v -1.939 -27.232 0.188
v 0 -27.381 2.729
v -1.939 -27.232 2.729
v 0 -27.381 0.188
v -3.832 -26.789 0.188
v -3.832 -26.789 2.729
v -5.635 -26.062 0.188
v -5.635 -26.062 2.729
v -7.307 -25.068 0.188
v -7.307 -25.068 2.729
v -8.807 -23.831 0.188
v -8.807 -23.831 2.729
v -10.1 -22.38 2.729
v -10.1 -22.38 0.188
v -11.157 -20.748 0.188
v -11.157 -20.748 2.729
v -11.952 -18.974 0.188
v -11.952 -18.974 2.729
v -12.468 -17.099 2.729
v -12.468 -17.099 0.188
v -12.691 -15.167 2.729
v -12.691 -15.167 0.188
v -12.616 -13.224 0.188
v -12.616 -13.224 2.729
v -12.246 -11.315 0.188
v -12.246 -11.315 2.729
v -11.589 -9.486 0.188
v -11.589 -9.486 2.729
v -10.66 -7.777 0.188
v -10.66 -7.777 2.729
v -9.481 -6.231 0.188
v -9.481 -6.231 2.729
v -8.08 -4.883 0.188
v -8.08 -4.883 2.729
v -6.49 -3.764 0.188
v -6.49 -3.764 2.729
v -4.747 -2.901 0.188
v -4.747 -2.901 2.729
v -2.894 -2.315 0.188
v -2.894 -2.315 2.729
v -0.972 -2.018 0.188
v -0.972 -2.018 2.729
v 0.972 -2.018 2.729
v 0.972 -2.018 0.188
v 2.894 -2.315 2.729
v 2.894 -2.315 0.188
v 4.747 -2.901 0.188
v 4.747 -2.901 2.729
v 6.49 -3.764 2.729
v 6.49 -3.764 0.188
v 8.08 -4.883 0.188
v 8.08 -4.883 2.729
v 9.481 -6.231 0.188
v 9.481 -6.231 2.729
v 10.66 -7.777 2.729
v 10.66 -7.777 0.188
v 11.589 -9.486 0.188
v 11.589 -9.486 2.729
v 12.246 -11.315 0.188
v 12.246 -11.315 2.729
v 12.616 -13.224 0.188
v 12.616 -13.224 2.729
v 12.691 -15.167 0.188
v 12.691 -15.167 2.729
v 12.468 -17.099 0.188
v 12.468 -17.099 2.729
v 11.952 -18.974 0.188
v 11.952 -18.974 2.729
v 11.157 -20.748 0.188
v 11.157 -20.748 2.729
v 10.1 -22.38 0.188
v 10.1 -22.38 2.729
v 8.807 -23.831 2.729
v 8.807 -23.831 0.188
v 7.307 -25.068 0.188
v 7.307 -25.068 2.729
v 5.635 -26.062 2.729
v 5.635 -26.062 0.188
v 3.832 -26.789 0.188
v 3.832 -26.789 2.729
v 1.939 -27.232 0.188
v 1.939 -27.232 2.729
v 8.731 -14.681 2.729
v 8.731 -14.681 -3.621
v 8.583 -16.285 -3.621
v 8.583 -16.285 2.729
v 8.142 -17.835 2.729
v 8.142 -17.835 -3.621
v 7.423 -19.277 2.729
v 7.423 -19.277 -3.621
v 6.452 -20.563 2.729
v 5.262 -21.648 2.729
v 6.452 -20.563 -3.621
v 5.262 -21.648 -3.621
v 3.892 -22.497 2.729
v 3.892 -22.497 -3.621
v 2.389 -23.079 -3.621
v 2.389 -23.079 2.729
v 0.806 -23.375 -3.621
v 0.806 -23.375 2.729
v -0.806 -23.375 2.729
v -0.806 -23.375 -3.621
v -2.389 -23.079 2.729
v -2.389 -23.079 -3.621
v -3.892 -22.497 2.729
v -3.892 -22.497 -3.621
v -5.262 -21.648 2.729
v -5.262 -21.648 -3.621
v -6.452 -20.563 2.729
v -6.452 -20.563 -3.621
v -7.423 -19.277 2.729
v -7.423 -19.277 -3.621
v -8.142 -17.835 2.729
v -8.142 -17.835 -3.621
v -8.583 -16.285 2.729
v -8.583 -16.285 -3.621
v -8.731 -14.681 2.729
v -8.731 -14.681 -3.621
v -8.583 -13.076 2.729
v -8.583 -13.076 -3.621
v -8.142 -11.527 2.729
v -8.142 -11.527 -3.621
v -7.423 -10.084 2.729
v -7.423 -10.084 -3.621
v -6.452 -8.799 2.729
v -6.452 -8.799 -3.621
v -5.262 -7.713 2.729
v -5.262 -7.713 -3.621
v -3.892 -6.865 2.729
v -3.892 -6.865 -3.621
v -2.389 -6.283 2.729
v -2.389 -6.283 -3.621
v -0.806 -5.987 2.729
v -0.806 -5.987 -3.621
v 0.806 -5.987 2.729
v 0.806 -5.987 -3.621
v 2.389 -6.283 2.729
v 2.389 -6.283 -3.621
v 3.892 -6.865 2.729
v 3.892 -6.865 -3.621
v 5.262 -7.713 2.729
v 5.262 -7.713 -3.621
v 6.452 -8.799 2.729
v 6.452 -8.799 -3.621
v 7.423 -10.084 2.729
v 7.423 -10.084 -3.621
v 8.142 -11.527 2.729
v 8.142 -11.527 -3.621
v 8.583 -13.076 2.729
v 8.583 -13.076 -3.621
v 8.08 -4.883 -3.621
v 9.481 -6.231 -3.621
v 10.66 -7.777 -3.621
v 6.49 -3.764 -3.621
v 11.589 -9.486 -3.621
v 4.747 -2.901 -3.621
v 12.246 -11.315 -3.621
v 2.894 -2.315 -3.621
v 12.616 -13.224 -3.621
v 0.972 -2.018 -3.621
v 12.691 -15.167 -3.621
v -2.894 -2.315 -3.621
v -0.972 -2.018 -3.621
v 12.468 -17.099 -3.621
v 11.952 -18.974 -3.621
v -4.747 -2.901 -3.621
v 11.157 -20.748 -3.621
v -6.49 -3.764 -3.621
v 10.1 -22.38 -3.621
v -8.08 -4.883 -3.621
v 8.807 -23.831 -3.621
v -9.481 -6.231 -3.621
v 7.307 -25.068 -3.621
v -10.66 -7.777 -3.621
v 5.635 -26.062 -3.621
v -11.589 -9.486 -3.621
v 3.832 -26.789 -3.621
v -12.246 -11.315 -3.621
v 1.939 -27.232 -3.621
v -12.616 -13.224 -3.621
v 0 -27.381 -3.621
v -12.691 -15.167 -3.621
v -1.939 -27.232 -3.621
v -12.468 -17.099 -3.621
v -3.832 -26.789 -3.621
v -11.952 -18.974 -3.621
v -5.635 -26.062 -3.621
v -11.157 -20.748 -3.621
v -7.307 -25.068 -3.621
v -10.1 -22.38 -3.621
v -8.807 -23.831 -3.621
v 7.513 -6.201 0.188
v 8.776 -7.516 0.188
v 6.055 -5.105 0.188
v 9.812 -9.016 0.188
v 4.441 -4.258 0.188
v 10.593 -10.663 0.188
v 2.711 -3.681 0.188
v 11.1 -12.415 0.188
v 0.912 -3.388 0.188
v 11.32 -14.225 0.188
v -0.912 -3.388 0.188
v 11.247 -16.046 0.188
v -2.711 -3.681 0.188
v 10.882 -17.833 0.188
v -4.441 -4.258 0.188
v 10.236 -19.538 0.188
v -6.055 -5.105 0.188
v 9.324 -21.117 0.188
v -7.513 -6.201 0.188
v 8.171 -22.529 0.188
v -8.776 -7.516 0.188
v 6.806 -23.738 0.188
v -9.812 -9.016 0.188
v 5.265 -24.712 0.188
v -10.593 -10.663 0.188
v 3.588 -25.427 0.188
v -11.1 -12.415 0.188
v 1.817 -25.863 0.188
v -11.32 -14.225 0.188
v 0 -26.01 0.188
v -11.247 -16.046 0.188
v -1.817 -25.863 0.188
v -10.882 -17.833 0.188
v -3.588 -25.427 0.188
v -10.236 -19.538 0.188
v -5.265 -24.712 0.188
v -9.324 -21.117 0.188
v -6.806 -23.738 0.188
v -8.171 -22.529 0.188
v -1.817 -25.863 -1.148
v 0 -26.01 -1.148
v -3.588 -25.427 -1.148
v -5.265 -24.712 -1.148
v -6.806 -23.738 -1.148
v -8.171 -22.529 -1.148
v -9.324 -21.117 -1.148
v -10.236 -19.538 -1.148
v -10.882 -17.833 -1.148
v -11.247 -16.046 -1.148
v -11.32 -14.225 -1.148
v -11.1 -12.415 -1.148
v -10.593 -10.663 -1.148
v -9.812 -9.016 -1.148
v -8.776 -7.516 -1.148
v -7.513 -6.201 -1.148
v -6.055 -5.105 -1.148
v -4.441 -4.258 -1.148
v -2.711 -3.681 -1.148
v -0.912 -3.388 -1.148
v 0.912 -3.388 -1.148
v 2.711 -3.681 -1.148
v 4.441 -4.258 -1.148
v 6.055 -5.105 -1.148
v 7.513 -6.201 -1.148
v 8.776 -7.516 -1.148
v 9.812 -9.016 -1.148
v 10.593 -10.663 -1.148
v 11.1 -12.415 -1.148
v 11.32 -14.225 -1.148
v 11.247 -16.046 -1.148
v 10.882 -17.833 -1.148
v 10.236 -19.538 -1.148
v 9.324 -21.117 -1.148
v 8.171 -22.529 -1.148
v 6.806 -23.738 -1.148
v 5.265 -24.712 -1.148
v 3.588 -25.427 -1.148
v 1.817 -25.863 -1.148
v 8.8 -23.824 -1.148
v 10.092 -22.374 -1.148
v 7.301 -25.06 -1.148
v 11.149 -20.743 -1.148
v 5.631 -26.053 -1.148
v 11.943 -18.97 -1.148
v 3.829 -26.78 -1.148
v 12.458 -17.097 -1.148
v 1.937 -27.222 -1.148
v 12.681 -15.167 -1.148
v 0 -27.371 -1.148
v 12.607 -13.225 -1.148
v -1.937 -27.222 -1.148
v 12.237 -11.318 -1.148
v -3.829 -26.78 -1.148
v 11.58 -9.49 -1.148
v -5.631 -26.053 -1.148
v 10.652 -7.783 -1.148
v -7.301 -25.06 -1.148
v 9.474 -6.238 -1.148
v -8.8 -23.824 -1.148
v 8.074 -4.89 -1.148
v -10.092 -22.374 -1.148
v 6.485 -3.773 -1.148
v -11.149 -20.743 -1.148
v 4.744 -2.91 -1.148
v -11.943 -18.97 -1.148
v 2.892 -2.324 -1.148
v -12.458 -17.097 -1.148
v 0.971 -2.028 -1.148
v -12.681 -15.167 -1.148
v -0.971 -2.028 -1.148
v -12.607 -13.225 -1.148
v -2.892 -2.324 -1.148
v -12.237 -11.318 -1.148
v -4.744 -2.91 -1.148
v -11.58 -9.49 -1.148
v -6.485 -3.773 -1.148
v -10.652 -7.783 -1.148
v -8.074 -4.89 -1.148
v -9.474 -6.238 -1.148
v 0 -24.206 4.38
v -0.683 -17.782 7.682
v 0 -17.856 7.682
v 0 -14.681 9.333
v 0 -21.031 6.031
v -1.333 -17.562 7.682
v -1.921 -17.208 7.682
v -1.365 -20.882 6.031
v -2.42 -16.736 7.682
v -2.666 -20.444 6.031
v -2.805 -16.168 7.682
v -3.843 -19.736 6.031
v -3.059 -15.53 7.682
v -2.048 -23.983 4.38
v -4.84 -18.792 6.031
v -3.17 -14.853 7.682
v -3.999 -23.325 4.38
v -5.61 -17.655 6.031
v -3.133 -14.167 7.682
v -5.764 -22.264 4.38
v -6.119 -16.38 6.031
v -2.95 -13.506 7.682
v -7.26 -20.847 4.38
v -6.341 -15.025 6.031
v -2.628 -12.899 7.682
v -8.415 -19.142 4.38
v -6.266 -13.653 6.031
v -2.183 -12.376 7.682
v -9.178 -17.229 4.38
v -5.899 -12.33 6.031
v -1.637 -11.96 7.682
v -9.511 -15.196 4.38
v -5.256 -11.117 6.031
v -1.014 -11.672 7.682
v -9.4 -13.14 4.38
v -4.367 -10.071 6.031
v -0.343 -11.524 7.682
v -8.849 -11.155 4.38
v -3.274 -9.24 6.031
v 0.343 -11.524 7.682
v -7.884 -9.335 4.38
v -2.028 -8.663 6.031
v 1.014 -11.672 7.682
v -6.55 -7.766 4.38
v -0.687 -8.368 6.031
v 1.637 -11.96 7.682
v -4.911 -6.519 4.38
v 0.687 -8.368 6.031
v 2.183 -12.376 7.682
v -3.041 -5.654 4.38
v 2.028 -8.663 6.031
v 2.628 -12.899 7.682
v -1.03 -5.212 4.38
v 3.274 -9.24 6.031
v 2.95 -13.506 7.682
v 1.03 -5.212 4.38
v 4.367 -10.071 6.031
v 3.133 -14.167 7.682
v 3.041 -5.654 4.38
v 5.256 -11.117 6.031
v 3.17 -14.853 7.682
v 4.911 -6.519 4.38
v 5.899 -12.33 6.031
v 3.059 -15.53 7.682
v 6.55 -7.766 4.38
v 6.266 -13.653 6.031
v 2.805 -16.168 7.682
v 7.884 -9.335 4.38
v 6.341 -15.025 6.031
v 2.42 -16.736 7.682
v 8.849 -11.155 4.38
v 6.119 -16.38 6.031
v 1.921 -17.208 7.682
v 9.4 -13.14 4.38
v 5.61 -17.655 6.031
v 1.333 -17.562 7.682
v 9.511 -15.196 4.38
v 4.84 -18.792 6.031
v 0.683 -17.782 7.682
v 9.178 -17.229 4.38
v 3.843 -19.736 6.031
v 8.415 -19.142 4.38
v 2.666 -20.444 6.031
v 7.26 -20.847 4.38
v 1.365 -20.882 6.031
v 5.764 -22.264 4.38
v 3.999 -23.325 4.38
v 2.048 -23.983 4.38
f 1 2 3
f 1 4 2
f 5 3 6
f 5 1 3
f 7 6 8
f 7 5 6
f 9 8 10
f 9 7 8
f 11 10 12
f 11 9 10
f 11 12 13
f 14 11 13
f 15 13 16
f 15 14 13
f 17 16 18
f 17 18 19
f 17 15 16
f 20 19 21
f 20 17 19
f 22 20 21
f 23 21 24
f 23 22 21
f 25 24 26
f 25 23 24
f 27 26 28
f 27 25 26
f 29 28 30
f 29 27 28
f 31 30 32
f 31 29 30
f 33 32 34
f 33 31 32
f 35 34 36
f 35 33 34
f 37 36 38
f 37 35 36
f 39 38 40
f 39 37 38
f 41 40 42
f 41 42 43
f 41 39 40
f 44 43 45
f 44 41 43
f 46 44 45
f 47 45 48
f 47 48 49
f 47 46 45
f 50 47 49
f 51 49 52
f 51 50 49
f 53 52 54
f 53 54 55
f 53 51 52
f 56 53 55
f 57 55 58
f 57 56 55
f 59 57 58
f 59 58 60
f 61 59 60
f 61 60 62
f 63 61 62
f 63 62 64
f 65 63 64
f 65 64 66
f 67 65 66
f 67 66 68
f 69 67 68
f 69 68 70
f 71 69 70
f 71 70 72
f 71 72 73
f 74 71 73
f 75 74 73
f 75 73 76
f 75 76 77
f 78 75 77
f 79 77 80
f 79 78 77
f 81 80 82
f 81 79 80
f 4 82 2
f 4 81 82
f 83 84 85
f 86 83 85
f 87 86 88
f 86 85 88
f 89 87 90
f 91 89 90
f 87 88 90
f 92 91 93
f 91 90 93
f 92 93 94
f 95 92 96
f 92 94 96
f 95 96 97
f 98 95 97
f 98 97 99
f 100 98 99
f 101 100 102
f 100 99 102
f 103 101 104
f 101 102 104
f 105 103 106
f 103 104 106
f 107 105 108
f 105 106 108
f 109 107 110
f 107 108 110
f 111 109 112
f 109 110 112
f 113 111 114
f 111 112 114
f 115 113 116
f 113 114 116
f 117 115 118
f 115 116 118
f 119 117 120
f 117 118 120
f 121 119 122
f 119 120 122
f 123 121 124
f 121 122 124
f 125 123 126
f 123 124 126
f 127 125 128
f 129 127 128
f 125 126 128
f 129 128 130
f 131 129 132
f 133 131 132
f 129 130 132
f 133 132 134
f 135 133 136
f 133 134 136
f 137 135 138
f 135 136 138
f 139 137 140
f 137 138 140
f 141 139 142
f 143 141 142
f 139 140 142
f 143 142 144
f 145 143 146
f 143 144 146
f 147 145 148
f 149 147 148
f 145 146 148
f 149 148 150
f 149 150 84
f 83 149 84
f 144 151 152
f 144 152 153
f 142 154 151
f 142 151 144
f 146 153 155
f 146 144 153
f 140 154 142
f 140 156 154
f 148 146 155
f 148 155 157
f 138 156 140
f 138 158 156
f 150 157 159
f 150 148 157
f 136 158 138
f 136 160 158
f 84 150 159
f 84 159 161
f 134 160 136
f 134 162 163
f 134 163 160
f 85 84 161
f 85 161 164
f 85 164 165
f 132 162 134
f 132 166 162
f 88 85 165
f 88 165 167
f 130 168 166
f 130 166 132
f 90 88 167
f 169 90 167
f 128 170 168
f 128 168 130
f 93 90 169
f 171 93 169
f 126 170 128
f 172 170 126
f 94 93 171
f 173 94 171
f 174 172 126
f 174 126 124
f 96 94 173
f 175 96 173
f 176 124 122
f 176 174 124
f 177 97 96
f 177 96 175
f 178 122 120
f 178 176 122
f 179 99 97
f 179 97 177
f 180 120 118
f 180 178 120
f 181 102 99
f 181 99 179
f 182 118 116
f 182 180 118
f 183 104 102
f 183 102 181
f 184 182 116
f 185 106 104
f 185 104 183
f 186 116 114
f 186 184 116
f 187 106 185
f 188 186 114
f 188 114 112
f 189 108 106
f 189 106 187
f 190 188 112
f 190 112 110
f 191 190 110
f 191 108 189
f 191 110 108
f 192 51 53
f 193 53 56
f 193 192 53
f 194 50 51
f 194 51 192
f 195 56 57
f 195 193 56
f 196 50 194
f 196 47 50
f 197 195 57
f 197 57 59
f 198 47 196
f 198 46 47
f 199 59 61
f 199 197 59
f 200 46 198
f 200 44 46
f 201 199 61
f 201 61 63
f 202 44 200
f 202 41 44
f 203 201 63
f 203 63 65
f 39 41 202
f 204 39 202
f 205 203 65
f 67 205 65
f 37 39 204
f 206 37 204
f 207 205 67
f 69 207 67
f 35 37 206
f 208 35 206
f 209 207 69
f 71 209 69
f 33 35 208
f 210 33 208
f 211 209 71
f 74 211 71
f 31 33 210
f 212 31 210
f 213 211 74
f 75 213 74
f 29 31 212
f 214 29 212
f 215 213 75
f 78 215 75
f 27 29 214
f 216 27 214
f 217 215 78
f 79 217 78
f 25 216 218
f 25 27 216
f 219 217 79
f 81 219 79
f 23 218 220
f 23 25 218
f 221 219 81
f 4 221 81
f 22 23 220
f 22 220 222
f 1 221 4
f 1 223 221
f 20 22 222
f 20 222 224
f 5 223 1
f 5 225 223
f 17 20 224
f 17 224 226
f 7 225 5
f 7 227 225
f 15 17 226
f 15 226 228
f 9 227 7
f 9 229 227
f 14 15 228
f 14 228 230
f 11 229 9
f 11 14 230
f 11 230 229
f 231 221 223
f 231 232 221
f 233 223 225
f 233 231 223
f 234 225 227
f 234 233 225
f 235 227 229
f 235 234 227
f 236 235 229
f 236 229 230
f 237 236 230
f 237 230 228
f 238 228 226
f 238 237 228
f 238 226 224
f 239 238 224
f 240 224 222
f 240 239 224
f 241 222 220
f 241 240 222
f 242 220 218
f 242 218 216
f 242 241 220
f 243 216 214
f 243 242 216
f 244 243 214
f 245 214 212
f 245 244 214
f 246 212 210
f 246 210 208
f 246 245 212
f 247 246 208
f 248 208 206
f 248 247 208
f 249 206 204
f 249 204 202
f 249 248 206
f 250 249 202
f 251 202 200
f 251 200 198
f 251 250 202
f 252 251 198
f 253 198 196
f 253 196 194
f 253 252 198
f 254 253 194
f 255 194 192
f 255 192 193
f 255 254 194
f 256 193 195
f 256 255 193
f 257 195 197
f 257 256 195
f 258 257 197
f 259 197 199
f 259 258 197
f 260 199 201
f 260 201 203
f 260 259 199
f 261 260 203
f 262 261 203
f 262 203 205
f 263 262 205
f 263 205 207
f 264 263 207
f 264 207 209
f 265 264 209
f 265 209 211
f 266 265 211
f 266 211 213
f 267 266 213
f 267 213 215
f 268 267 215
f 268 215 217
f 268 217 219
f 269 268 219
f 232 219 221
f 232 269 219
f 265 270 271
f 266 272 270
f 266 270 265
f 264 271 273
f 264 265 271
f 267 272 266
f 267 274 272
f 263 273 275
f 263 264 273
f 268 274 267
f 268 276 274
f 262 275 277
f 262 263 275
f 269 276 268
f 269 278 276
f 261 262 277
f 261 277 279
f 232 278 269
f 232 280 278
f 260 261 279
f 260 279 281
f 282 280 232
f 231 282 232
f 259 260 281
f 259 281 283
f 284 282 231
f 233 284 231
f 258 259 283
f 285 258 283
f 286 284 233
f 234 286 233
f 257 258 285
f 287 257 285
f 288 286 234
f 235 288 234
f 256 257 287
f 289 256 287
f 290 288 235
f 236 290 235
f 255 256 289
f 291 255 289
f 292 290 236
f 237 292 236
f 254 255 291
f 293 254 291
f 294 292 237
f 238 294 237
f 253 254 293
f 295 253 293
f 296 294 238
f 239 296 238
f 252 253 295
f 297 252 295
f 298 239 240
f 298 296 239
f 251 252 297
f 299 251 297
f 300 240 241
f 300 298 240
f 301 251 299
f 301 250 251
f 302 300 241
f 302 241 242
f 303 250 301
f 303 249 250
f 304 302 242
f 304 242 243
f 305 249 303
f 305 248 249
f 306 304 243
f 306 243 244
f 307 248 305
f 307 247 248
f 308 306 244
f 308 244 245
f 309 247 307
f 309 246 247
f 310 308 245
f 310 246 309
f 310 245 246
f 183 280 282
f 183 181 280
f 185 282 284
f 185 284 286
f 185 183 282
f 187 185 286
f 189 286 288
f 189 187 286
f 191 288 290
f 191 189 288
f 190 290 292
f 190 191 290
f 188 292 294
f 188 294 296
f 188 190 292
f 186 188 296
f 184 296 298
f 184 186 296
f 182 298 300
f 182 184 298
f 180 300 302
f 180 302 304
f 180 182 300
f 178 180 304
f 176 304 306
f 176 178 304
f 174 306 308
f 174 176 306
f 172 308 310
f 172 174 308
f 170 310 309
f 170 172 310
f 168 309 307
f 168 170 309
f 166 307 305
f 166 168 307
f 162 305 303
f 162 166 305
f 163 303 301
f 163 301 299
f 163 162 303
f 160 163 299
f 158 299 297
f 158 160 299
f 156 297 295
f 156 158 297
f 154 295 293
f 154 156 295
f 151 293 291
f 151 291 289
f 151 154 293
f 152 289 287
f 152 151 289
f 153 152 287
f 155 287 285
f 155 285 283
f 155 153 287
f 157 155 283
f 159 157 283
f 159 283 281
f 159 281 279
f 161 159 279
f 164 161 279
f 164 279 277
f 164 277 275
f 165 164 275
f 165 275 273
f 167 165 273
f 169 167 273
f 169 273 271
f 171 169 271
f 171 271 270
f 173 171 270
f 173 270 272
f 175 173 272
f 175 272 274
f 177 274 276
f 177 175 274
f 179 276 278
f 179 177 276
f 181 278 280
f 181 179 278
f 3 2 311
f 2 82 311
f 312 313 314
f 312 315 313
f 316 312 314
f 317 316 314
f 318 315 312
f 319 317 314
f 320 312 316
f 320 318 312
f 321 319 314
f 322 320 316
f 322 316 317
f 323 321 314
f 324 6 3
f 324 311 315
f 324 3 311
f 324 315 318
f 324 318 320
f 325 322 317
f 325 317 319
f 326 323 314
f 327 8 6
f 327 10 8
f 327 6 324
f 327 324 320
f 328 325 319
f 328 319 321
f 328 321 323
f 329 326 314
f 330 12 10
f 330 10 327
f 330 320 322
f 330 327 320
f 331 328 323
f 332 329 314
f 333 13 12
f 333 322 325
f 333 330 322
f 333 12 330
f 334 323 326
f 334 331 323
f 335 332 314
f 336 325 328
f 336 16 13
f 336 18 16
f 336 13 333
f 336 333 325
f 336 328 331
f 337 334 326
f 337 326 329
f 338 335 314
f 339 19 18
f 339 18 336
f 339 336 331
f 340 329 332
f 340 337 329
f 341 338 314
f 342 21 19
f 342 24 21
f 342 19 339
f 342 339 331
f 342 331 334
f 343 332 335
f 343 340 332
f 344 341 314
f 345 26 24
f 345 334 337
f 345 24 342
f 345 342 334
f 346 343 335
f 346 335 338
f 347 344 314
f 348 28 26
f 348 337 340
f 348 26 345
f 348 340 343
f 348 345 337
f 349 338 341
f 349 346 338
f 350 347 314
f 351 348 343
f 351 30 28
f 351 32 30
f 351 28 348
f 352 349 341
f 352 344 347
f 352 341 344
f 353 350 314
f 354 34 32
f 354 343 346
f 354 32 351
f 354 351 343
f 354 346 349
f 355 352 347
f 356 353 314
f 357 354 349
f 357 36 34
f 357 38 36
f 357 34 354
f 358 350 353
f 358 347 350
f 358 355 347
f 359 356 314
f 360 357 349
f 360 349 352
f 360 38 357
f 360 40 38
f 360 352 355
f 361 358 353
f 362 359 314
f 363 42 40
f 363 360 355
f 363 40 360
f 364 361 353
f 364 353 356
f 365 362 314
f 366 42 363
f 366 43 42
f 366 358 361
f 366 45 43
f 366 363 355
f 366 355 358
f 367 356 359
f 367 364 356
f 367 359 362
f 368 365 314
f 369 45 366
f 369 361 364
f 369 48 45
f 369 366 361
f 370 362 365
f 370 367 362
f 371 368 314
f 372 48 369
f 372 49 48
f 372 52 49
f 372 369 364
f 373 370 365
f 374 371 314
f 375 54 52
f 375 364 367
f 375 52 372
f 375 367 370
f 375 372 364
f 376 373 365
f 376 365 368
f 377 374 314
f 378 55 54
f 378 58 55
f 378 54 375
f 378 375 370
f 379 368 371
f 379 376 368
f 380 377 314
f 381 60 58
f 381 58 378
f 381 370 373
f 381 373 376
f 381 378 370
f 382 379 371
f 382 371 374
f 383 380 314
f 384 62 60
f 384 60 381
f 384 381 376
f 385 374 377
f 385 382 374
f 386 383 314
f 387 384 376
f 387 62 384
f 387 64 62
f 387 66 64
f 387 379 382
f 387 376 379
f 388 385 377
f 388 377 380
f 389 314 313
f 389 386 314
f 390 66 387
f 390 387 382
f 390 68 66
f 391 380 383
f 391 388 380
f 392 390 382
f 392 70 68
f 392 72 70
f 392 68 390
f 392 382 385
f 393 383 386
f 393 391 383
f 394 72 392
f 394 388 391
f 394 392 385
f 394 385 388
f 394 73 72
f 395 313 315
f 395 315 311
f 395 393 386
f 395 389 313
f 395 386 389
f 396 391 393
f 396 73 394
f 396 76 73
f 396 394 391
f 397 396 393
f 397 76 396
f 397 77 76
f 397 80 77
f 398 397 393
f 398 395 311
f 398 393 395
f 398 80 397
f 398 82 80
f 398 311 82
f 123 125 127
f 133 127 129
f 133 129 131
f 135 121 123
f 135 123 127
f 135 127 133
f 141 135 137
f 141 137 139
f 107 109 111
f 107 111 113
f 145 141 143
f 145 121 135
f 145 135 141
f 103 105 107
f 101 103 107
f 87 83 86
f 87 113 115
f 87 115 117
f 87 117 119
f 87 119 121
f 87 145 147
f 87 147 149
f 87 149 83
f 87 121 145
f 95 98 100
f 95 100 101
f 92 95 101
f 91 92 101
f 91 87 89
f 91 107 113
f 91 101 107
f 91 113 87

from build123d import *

# Parameters (mm, degrees)
F2_R     = 8.73125
F3_DEPTH = 6.35


with BuildPart() as f1:
    # F0 (on Right) → F1 (revolve)
    with BuildSketch(Plane.YZ):
        Polygon((-14.680734, 9.332753), (-27.380734, 2.729445), (-27.380734, 0.187998), (-26.010094, 0.187998), (-26.010094, -1.148191), (-27.371027, -1.148191), (-27.380734, -3.620555), (-14.680734, -3.620555), align=None)
    revolve(axis=Axis((0, -14.680734, 2.856099), (0, 0, -1)))

    # F2 (on face) → F3 (cut)
    with BuildSketch(Plane(origin=(0, 0, -3.620555), x_dir=(1, 0, 0), z_dir=(0, 0, -1))):
        with Locations((0, 14.680734)):
            Circle(F2_R)
    extrude(amount=-F3_DEPTH, mode=Mode.SUBTRACT)


solid = f1.part
